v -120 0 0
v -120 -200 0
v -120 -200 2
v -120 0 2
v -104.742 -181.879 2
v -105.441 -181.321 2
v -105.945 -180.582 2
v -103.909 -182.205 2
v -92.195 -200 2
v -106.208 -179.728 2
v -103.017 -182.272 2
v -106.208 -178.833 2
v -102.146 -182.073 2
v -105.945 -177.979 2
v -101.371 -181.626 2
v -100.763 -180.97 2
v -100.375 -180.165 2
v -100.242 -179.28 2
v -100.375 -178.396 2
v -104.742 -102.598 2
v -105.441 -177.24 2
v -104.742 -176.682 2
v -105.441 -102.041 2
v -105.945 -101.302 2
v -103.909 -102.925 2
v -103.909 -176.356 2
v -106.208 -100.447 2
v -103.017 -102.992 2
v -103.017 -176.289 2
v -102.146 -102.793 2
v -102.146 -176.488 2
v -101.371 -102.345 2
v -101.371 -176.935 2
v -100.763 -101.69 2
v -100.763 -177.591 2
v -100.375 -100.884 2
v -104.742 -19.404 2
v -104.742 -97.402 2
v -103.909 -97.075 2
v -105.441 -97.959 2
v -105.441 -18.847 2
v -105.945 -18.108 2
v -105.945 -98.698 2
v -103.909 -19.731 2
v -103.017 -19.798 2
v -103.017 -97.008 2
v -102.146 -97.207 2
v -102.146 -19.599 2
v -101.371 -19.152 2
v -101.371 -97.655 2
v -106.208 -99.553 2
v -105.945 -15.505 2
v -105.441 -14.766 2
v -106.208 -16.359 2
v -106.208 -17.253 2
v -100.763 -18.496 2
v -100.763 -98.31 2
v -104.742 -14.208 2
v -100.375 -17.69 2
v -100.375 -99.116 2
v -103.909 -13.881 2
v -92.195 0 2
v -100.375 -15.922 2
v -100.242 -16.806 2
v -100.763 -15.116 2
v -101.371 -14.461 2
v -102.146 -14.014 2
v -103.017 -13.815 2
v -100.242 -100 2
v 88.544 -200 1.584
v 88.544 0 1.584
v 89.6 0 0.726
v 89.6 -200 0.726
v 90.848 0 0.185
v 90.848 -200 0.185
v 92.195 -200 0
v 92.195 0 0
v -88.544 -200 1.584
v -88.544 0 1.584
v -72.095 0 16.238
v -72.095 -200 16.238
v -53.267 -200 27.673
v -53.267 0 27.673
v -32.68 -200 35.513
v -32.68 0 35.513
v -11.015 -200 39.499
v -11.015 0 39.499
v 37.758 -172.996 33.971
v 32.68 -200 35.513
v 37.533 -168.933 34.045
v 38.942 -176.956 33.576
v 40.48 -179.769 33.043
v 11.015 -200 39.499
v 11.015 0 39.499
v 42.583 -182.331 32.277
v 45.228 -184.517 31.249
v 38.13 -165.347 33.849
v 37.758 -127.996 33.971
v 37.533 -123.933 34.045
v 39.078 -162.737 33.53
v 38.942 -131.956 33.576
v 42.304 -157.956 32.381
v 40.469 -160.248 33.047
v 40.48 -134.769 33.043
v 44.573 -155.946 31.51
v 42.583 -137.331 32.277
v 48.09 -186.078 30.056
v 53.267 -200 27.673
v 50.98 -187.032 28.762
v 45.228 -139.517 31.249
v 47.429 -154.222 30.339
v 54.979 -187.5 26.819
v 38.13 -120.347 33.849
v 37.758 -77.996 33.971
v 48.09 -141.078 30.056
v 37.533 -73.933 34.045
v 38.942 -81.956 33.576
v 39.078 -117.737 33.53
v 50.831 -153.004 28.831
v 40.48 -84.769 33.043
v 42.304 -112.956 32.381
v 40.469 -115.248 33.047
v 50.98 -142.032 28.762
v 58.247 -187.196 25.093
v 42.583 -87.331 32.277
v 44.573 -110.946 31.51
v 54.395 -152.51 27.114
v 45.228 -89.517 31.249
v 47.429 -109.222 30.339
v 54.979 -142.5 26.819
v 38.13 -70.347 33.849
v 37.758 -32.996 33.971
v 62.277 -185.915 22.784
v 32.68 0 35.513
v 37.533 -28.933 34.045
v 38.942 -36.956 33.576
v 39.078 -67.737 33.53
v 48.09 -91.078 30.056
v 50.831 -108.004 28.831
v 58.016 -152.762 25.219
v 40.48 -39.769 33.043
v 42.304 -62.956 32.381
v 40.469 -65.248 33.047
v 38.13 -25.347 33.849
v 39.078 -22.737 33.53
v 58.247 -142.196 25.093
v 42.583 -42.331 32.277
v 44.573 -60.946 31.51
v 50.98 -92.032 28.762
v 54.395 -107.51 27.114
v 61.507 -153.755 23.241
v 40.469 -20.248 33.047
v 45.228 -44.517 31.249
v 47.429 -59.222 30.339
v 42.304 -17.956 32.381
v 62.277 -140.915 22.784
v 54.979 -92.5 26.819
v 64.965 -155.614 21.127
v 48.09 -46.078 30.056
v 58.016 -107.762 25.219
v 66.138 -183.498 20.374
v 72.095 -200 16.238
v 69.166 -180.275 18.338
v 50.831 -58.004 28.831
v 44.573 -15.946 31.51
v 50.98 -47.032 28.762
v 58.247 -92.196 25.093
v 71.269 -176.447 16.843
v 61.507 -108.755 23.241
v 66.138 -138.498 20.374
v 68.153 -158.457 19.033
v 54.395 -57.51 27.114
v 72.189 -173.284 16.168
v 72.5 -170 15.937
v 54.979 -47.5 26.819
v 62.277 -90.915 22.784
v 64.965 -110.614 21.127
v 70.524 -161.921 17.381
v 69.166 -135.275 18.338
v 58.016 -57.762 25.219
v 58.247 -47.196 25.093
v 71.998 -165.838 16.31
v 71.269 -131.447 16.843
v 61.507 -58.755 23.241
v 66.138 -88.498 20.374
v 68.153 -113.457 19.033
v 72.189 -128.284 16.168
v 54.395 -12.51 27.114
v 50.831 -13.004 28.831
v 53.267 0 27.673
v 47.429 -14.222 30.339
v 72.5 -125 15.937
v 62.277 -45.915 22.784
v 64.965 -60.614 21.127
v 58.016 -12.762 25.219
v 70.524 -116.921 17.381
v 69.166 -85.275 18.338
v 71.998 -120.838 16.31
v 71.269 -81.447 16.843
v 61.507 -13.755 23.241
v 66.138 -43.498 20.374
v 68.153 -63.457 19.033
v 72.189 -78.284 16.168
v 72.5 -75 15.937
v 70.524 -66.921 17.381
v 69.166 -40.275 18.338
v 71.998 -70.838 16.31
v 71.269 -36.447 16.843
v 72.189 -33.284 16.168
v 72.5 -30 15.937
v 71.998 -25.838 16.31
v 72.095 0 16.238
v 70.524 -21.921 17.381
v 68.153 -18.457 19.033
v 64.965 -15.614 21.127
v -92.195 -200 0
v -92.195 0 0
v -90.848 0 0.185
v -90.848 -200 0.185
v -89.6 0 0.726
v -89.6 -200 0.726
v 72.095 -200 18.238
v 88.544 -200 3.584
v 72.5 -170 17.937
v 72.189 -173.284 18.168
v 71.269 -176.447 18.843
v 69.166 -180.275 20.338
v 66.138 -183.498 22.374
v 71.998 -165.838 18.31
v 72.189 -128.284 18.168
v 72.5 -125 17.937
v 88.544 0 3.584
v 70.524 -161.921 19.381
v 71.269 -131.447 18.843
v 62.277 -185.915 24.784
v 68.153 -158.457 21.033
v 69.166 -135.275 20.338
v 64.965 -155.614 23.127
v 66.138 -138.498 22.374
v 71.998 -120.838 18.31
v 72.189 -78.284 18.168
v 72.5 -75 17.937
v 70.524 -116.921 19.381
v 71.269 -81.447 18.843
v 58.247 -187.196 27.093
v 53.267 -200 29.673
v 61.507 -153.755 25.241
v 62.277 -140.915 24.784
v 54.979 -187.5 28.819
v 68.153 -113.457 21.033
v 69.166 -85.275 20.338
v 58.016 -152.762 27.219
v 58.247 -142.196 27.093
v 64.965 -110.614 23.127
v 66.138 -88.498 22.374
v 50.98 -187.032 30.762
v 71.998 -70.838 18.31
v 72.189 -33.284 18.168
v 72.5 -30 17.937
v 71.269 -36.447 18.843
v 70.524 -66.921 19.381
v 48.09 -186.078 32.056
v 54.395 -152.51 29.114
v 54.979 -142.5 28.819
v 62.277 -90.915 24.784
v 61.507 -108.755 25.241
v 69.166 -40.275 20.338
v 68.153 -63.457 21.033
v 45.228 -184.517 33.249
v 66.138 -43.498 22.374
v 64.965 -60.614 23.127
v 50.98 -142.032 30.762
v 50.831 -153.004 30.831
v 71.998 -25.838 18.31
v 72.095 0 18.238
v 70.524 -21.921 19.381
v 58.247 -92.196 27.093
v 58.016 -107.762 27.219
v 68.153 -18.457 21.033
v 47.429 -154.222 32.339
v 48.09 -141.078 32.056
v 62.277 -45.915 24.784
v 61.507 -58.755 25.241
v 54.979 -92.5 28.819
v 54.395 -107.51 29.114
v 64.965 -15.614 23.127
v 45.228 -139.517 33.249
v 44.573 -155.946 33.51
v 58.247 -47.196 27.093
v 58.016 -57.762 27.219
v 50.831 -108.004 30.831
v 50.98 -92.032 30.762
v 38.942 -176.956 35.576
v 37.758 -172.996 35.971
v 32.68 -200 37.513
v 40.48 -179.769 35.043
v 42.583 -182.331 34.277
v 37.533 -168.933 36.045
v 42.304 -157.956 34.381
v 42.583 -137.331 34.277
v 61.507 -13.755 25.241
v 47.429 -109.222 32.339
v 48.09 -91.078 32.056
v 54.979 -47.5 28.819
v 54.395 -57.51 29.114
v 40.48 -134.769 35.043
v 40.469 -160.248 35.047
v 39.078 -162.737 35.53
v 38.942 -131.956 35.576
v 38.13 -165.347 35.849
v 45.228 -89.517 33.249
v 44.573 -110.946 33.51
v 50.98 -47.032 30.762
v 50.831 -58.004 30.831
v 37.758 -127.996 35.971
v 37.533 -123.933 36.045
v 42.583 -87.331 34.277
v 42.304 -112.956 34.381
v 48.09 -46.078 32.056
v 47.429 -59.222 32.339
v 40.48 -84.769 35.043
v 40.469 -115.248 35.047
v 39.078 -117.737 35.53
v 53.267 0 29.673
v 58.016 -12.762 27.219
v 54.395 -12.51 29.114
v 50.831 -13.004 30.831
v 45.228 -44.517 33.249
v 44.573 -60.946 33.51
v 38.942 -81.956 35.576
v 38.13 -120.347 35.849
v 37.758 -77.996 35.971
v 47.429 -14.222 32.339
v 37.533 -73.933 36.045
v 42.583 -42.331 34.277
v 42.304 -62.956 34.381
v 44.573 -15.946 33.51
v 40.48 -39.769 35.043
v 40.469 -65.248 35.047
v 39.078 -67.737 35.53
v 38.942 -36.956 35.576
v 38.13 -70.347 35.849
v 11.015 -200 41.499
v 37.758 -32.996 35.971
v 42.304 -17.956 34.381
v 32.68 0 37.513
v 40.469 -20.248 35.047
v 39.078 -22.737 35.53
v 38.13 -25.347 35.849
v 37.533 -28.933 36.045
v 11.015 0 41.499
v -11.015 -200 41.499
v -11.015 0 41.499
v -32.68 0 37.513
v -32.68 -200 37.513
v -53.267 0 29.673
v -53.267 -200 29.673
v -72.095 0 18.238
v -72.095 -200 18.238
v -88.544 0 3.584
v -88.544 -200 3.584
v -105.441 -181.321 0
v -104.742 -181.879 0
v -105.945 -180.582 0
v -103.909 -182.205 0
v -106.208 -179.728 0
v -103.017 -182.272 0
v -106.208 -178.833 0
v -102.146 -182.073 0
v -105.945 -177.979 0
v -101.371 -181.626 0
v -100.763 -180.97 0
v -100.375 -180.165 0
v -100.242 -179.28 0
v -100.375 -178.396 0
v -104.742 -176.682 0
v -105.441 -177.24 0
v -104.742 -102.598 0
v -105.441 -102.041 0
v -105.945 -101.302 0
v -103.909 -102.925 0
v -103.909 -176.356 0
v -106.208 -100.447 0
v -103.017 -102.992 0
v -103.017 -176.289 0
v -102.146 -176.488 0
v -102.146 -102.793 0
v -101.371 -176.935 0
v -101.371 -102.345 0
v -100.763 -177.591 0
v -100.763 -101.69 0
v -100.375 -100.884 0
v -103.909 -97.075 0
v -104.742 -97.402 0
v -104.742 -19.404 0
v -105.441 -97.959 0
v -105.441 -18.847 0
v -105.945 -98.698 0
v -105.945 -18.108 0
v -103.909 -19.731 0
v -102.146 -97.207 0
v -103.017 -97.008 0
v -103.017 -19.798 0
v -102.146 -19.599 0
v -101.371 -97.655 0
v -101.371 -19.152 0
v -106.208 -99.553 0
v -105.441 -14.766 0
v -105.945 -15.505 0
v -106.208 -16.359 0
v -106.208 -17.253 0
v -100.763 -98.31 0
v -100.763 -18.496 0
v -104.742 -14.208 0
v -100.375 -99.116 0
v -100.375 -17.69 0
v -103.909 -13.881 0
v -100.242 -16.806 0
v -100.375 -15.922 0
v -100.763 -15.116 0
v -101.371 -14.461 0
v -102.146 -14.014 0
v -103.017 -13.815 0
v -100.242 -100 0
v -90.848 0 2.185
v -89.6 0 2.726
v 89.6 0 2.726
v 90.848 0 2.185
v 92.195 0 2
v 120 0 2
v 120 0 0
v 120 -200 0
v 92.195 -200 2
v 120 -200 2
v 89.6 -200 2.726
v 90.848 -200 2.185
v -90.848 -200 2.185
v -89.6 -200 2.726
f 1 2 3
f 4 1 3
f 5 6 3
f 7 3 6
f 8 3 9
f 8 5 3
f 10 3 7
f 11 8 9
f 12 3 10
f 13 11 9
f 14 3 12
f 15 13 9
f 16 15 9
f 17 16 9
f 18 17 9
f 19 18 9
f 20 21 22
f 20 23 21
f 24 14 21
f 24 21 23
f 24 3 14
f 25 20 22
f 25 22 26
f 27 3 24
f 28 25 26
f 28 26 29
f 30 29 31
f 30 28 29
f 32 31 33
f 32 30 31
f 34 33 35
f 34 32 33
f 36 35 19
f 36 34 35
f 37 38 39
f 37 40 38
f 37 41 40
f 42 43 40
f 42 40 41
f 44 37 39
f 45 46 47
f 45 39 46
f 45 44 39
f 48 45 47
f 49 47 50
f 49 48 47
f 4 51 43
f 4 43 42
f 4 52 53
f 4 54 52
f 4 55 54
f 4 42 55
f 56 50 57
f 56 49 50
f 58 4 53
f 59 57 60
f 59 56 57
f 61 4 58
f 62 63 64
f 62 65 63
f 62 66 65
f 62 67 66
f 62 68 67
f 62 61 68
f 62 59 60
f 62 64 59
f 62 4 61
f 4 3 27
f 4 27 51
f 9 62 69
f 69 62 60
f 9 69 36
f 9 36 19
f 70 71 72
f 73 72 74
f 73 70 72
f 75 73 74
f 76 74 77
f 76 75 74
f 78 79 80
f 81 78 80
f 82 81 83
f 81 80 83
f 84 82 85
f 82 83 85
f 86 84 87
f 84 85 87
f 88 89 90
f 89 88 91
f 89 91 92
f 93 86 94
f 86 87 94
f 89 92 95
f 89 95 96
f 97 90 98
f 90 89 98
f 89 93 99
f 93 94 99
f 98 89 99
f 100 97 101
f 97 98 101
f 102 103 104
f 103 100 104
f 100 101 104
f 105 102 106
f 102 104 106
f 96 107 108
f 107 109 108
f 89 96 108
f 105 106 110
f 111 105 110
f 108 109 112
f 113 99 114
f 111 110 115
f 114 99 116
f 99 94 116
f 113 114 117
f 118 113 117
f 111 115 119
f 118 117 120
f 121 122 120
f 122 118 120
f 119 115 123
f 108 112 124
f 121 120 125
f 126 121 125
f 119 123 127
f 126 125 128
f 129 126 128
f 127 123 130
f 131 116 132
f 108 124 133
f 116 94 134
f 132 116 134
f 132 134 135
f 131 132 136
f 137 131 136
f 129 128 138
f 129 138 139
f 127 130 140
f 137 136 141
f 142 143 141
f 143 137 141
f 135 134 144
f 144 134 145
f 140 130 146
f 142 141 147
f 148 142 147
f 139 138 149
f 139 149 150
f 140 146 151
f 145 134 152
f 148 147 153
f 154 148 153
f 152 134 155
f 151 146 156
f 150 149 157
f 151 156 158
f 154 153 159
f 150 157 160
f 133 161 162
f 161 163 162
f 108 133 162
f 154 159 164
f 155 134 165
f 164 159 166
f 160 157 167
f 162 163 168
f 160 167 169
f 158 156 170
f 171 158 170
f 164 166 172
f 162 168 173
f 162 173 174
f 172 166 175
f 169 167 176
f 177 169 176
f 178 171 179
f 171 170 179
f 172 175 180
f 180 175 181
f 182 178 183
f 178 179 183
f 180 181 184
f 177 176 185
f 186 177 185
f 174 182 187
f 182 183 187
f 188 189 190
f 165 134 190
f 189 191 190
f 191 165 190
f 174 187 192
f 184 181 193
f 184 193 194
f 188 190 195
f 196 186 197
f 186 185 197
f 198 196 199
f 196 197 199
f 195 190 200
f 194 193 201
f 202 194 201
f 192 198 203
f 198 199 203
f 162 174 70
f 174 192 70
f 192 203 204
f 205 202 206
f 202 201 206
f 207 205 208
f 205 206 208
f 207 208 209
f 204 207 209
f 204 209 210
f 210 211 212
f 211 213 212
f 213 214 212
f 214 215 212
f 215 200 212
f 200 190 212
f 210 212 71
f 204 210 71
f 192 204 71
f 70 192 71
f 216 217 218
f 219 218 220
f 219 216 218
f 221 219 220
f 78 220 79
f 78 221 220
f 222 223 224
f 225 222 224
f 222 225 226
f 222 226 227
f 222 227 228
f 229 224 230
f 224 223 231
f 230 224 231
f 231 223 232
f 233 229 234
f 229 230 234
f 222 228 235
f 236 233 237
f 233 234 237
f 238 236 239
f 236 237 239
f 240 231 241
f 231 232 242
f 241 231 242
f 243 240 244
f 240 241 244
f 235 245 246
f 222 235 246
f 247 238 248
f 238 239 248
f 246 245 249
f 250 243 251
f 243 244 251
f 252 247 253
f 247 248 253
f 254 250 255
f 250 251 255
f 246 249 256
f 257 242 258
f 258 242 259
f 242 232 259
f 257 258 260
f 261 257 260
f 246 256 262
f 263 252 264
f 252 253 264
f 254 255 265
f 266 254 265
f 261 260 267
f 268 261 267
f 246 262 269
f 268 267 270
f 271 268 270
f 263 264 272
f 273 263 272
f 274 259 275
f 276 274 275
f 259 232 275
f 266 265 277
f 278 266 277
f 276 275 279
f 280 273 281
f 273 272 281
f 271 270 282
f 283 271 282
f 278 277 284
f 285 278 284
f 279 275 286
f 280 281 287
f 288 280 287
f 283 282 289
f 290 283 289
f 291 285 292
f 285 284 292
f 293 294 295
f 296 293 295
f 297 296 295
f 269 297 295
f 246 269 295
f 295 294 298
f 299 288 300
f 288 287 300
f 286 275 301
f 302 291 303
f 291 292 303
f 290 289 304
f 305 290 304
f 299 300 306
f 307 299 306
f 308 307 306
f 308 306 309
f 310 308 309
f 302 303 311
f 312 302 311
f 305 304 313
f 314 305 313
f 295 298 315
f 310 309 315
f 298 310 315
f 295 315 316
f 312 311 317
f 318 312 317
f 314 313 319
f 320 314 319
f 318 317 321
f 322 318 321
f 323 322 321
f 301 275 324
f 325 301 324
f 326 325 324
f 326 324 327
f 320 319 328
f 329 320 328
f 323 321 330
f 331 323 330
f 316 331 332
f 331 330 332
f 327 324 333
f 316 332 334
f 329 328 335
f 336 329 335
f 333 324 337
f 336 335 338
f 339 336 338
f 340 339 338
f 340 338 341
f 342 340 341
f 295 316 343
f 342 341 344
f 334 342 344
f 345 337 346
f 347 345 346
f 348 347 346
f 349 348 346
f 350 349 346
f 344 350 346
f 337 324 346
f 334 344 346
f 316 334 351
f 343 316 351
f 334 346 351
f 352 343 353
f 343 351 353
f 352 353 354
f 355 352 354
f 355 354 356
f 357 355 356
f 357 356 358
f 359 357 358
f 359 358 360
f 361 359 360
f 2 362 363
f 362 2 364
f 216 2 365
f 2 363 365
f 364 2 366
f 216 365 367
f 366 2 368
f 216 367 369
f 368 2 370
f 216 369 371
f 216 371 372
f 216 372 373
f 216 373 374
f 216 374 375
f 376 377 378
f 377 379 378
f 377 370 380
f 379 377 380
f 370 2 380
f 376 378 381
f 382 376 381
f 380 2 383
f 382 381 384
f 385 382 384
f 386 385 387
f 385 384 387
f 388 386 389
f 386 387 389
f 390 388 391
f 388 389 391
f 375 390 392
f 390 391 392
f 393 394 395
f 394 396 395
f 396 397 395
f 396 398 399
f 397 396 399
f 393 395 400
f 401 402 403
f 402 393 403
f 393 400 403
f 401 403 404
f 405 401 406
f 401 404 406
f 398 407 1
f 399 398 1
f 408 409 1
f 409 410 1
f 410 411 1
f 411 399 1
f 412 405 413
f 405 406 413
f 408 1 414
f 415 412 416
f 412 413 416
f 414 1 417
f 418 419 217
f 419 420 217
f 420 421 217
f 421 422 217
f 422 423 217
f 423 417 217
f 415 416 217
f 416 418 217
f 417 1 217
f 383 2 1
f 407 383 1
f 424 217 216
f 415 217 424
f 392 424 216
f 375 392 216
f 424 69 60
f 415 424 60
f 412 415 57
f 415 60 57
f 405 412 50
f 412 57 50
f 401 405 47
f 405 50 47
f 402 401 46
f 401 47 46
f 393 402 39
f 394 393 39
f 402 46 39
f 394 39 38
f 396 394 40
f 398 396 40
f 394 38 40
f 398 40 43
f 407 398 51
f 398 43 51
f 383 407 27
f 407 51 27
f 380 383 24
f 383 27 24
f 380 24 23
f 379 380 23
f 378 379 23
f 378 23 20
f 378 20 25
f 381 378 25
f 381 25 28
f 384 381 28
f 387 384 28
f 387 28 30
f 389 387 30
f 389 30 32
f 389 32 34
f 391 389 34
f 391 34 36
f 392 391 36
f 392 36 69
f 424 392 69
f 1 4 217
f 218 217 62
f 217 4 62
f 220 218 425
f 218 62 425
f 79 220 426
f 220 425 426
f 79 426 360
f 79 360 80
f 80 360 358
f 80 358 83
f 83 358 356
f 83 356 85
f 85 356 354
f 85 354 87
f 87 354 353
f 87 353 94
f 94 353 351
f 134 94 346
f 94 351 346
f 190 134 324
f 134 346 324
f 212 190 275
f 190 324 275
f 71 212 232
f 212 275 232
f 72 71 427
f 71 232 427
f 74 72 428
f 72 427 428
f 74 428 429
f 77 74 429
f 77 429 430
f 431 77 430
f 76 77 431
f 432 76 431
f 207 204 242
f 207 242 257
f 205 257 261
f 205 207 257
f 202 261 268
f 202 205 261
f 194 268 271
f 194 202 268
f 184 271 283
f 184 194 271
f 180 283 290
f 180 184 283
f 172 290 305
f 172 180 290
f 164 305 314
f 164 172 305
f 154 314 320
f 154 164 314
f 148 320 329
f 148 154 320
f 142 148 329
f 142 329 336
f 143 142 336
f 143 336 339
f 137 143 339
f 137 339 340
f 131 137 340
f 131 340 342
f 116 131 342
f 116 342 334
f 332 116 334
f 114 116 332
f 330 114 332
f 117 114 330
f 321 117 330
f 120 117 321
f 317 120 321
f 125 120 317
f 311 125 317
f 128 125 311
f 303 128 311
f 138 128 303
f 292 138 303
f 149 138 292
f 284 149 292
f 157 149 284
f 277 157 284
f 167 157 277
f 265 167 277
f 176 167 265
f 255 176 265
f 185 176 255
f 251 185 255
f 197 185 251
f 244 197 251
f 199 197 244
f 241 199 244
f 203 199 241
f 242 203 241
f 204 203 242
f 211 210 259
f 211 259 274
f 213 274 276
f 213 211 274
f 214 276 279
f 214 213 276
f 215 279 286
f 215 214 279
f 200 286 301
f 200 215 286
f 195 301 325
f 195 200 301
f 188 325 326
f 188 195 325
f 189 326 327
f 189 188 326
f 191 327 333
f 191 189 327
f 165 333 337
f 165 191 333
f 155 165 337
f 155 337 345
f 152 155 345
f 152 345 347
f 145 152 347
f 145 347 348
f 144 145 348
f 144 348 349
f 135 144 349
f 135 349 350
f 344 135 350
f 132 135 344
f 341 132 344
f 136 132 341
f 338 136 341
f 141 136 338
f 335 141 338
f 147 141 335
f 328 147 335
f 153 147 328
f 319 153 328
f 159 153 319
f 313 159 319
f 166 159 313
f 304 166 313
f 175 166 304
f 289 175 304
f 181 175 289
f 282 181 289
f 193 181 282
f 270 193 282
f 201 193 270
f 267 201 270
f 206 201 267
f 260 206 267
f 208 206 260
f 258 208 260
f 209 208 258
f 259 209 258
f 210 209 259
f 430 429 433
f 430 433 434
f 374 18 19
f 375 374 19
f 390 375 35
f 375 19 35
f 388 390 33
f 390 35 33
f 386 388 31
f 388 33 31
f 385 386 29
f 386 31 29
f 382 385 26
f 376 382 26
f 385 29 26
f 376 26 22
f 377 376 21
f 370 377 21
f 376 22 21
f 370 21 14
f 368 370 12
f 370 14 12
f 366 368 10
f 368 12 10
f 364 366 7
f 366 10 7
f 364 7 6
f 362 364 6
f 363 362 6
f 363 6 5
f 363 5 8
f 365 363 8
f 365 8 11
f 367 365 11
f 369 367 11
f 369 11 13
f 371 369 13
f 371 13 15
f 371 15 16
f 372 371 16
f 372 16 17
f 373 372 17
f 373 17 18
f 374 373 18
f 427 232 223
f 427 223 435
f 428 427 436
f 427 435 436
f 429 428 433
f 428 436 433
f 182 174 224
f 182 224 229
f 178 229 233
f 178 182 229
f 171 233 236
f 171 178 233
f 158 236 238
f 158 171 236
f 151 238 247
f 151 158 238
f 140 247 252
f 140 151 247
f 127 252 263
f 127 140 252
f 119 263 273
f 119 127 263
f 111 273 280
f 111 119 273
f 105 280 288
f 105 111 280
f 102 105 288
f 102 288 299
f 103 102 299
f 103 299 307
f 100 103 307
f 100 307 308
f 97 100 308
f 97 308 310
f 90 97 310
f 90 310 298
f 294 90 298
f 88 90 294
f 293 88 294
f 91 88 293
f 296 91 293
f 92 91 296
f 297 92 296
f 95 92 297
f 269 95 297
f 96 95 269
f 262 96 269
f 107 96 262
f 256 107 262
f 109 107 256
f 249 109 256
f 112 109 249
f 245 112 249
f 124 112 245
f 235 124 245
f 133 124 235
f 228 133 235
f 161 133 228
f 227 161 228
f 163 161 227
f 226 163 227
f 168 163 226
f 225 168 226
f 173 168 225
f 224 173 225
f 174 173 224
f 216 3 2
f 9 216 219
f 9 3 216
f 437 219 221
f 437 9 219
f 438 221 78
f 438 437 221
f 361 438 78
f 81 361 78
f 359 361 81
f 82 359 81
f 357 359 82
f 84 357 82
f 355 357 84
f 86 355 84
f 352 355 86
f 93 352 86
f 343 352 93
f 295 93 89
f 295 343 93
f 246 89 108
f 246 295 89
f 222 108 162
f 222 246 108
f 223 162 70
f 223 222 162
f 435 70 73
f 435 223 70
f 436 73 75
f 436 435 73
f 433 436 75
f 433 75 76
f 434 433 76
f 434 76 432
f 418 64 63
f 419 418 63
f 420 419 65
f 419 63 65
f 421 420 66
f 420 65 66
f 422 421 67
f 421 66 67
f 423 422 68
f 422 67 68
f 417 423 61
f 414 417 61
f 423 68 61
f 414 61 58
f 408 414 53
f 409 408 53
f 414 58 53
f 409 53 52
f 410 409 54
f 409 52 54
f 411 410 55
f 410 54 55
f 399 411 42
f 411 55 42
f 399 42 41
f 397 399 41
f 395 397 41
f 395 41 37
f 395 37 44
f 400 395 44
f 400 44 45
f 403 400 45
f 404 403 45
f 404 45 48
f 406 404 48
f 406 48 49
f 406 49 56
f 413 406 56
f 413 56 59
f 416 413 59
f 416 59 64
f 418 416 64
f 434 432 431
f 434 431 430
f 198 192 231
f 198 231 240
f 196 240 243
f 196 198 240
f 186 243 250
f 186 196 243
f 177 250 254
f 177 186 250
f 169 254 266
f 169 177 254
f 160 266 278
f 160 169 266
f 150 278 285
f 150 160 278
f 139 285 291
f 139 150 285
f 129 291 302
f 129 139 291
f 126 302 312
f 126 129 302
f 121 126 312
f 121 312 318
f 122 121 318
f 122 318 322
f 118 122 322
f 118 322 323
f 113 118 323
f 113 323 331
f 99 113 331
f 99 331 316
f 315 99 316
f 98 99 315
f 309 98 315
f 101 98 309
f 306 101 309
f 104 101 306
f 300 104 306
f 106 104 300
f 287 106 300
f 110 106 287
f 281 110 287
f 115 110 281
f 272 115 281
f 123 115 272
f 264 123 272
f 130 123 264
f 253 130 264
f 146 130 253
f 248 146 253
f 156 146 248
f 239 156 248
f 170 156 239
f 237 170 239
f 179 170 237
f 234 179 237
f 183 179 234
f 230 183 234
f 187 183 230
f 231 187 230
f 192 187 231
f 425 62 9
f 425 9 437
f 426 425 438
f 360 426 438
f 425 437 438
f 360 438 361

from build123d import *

# Parameters (mm, degrees)
F0_W     = 30
F0_H     = 2
F1_DEPTH = 200
F2_R     = 3
F3_DEPTH = 25
F2_R_2   = 17.5
F4_DEPTH = 50
F5_R     = 5
F6_R     = 5


with BuildPart() as f1:
    # F0 (on Front) → F1 (new body)
    with BuildSketch(Plane.XZ):
        with Locations((-105, 1)):
            Rectangle(F0_W, F0_H)
        with BuildLine():
            Line((-90, 2), (-90, 0))
            ThreePointArc((-90, 0), (0, 40), (90, 0))
            Line((90, 0), (90, 2))
            ThreePointArc((90, 2), (0, 42), (-90, 2))
        make_face()
        with Locations((105, 1)):
            Rectangle(F0_W, F0_H)
    extrude(amount=F1_DEPTH)

    # F2 (on face) → F3 (cut)
    with BuildSketch(Plane.XY.offset(2)):
        with Locations((-103.241667, -16.80618)):
            Circle(F2_R)
        with Locations((-103.241667, -100)):
            Circle(F2_R)
        with Locations((-103.241667, -179.280475)):
            Circle(F2_R)
    extrude(amount=-F3_DEPTH, mode=Mode.SUBTRACT)

    # F2 (on face) → F4 (cut)
    with BuildSketch(Plane.XY.offset(2)):
        with Locations((55, -30)):
            Circle(F2_R_2)
        with Locations((55, -75)):
            Circle(F2_R_2)
        with Locations((55, -125)):
            Circle(F2_R_2)
        with Locations((55, -170)):
            Circle(F2_R_2)
    extrude(amount=F4_DEPTH, mode=Mode.SUBTRACT)

    # F5
    f5_edges = [f1.edges().sort_by_distance(p)[0] for p in [
        (-90, -100, 0),
        (-90, -100, 2),
    ]]
    fillet(f5_edges, radius=F5_R)

    # F6
    f6_edges = [f1.edges().sort_by_distance(p)[0] for p in [
        (90, -100, 2),
        (90, -100, 0),
    ]]
    fillet(f6_edges, radius=F6_R)


solid = f1.part
